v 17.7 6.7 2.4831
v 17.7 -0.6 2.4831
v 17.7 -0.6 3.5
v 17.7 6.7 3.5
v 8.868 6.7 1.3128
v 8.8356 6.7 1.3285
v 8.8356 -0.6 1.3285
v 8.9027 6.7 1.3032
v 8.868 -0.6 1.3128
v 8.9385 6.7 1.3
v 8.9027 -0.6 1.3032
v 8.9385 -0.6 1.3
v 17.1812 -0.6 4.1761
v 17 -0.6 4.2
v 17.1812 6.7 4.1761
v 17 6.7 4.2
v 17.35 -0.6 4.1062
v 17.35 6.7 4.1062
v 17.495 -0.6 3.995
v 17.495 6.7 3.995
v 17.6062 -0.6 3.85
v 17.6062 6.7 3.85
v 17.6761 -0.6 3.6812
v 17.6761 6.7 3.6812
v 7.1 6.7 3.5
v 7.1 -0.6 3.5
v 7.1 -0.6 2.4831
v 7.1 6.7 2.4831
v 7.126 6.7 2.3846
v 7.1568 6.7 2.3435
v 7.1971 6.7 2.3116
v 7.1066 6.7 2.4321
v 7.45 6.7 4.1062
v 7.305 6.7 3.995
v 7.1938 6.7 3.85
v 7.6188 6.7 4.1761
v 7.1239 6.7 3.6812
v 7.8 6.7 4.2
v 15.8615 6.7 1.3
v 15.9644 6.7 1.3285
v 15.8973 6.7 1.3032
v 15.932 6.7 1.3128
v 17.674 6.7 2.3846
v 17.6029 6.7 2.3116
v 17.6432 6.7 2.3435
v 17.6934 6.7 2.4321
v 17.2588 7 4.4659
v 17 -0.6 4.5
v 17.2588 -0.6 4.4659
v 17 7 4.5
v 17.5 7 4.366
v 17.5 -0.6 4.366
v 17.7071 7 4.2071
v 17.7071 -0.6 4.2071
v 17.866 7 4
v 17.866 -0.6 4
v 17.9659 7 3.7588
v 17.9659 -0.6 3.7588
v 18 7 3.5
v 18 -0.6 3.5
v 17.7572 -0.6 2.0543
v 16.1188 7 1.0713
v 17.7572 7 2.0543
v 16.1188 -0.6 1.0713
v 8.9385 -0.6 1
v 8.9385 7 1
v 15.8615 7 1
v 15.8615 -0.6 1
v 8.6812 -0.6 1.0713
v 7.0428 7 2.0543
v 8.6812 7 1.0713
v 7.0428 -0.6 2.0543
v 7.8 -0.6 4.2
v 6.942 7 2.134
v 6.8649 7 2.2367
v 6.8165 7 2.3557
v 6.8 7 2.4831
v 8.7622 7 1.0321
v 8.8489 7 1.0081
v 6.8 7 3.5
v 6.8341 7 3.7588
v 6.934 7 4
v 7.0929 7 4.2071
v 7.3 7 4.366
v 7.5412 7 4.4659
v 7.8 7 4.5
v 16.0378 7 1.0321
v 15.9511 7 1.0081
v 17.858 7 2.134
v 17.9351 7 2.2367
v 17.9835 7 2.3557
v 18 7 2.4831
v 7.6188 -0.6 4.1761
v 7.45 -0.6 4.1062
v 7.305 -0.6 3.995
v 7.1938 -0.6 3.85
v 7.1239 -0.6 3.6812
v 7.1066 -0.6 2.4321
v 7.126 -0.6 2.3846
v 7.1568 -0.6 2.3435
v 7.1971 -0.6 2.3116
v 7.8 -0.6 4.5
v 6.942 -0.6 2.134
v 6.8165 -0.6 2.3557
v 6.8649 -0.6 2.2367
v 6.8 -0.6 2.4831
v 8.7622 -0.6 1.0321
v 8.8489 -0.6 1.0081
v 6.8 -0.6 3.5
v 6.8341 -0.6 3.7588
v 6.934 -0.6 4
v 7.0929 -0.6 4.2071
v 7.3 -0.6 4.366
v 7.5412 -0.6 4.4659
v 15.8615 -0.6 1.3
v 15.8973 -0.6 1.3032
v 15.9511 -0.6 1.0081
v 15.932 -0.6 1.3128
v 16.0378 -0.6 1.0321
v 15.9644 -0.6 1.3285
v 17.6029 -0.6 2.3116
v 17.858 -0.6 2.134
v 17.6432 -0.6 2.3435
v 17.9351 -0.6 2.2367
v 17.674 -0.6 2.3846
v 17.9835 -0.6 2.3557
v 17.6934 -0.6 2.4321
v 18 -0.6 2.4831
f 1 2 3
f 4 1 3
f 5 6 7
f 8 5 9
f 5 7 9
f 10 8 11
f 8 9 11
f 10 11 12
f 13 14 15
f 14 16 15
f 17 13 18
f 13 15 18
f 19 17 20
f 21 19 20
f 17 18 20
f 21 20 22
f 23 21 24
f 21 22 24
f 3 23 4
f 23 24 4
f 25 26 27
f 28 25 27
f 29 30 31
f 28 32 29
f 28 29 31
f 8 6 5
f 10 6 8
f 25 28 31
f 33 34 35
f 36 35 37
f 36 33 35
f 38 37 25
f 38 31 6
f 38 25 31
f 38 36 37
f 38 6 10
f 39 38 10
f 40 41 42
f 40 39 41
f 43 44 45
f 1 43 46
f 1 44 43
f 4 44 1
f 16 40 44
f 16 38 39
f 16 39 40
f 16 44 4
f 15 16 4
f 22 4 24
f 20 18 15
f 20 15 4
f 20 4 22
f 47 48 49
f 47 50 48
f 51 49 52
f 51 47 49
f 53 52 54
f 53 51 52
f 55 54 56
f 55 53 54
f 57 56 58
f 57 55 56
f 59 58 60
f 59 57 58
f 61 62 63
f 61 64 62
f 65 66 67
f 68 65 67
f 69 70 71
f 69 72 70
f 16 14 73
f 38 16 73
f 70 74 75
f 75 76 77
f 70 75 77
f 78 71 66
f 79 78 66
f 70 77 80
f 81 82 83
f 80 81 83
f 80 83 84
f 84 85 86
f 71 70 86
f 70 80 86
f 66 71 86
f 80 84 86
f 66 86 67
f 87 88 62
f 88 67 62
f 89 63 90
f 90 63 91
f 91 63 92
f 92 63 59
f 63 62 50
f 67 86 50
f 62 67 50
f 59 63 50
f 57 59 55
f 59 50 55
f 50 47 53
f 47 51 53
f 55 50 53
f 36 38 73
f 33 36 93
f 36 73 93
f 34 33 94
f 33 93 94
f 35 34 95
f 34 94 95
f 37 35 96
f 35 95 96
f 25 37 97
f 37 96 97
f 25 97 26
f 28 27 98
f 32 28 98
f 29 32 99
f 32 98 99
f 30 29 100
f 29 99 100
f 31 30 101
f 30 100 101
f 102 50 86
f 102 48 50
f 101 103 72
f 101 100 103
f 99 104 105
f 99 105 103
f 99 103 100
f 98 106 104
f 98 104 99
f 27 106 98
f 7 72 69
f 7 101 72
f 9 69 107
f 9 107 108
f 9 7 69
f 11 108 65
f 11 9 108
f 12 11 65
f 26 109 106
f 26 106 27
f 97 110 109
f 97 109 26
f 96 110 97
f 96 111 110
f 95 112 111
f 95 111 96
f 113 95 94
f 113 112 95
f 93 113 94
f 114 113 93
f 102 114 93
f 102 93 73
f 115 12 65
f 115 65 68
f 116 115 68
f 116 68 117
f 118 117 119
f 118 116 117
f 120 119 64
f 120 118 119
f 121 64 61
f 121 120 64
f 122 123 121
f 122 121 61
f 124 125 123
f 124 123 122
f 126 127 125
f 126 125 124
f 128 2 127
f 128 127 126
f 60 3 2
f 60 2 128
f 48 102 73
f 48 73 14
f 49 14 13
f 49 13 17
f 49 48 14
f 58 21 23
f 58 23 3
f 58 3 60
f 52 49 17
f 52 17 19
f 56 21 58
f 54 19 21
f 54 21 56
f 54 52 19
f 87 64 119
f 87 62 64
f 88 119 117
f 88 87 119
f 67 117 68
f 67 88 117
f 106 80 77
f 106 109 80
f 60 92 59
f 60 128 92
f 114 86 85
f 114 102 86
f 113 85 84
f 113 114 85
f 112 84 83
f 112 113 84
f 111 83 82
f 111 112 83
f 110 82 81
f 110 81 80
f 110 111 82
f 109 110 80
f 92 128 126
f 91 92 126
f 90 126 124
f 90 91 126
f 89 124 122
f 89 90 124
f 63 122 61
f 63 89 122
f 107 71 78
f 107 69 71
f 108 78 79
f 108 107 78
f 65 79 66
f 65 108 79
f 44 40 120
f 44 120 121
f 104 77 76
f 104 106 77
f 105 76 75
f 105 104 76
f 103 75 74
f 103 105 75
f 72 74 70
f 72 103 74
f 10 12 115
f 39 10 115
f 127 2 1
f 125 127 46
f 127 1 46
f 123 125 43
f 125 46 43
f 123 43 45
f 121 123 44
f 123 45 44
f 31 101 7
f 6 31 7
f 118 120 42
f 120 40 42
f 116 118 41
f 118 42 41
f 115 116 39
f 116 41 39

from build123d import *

# Parameters (mm, degrees)
PAD004_DEPTH      = 0.6
PAD004_DEPTH_BACK = 7
FILLET001_R       = 1
FILLET002_R       = 0.5
THICKNESS002_T    = -0.3


with BuildPart() as part:
    # Sketch006 (on Face1 of ReferenceLinearPattern004) → Pad004 (new body, two sides)
    with BuildSketch(Plane.XZ) as pad004_sk:
        Polygon((18, 4.5), (6.8, 4.5), (6.8, 2.2), (8.8, 1), (16, 1), (18, 2.2), align=None)
    extrude(amount=PAD004_DEPTH)
    extrude(pad004_sk.sketch, amount=-PAD004_DEPTH_BACK)

    # Fillet001
    fillet001_edges = [part.edges().sort_by_distance(p)[0] for p in [
        (6.8, 3.2, 4.5),
        (18, 3.2, 4.5),
    ]]
    fillet(fillet001_edges, radius=FILLET001_R)

    # Fillet002
    fillet002_edges = [part.edges().sort_by_distance(p)[0] for p in [
        (6.8, 3.2, 2.2),
        (8.8, 3.2, 1),
        (16, 3.2, 1),
        (18, 3.2, 2.2),
    ]]
    fillet(fillet002_edges, radius=FILLET002_R)

    # Thickness002
    thickness002_openings = [part.faces().sort_by_distance(p)[0] for p in [
        (12.4, -0.6, 2.821651),
    ]]
    offset(amount=THICKNESS002_T, openings=thickness002_openings)


solid = part.part
